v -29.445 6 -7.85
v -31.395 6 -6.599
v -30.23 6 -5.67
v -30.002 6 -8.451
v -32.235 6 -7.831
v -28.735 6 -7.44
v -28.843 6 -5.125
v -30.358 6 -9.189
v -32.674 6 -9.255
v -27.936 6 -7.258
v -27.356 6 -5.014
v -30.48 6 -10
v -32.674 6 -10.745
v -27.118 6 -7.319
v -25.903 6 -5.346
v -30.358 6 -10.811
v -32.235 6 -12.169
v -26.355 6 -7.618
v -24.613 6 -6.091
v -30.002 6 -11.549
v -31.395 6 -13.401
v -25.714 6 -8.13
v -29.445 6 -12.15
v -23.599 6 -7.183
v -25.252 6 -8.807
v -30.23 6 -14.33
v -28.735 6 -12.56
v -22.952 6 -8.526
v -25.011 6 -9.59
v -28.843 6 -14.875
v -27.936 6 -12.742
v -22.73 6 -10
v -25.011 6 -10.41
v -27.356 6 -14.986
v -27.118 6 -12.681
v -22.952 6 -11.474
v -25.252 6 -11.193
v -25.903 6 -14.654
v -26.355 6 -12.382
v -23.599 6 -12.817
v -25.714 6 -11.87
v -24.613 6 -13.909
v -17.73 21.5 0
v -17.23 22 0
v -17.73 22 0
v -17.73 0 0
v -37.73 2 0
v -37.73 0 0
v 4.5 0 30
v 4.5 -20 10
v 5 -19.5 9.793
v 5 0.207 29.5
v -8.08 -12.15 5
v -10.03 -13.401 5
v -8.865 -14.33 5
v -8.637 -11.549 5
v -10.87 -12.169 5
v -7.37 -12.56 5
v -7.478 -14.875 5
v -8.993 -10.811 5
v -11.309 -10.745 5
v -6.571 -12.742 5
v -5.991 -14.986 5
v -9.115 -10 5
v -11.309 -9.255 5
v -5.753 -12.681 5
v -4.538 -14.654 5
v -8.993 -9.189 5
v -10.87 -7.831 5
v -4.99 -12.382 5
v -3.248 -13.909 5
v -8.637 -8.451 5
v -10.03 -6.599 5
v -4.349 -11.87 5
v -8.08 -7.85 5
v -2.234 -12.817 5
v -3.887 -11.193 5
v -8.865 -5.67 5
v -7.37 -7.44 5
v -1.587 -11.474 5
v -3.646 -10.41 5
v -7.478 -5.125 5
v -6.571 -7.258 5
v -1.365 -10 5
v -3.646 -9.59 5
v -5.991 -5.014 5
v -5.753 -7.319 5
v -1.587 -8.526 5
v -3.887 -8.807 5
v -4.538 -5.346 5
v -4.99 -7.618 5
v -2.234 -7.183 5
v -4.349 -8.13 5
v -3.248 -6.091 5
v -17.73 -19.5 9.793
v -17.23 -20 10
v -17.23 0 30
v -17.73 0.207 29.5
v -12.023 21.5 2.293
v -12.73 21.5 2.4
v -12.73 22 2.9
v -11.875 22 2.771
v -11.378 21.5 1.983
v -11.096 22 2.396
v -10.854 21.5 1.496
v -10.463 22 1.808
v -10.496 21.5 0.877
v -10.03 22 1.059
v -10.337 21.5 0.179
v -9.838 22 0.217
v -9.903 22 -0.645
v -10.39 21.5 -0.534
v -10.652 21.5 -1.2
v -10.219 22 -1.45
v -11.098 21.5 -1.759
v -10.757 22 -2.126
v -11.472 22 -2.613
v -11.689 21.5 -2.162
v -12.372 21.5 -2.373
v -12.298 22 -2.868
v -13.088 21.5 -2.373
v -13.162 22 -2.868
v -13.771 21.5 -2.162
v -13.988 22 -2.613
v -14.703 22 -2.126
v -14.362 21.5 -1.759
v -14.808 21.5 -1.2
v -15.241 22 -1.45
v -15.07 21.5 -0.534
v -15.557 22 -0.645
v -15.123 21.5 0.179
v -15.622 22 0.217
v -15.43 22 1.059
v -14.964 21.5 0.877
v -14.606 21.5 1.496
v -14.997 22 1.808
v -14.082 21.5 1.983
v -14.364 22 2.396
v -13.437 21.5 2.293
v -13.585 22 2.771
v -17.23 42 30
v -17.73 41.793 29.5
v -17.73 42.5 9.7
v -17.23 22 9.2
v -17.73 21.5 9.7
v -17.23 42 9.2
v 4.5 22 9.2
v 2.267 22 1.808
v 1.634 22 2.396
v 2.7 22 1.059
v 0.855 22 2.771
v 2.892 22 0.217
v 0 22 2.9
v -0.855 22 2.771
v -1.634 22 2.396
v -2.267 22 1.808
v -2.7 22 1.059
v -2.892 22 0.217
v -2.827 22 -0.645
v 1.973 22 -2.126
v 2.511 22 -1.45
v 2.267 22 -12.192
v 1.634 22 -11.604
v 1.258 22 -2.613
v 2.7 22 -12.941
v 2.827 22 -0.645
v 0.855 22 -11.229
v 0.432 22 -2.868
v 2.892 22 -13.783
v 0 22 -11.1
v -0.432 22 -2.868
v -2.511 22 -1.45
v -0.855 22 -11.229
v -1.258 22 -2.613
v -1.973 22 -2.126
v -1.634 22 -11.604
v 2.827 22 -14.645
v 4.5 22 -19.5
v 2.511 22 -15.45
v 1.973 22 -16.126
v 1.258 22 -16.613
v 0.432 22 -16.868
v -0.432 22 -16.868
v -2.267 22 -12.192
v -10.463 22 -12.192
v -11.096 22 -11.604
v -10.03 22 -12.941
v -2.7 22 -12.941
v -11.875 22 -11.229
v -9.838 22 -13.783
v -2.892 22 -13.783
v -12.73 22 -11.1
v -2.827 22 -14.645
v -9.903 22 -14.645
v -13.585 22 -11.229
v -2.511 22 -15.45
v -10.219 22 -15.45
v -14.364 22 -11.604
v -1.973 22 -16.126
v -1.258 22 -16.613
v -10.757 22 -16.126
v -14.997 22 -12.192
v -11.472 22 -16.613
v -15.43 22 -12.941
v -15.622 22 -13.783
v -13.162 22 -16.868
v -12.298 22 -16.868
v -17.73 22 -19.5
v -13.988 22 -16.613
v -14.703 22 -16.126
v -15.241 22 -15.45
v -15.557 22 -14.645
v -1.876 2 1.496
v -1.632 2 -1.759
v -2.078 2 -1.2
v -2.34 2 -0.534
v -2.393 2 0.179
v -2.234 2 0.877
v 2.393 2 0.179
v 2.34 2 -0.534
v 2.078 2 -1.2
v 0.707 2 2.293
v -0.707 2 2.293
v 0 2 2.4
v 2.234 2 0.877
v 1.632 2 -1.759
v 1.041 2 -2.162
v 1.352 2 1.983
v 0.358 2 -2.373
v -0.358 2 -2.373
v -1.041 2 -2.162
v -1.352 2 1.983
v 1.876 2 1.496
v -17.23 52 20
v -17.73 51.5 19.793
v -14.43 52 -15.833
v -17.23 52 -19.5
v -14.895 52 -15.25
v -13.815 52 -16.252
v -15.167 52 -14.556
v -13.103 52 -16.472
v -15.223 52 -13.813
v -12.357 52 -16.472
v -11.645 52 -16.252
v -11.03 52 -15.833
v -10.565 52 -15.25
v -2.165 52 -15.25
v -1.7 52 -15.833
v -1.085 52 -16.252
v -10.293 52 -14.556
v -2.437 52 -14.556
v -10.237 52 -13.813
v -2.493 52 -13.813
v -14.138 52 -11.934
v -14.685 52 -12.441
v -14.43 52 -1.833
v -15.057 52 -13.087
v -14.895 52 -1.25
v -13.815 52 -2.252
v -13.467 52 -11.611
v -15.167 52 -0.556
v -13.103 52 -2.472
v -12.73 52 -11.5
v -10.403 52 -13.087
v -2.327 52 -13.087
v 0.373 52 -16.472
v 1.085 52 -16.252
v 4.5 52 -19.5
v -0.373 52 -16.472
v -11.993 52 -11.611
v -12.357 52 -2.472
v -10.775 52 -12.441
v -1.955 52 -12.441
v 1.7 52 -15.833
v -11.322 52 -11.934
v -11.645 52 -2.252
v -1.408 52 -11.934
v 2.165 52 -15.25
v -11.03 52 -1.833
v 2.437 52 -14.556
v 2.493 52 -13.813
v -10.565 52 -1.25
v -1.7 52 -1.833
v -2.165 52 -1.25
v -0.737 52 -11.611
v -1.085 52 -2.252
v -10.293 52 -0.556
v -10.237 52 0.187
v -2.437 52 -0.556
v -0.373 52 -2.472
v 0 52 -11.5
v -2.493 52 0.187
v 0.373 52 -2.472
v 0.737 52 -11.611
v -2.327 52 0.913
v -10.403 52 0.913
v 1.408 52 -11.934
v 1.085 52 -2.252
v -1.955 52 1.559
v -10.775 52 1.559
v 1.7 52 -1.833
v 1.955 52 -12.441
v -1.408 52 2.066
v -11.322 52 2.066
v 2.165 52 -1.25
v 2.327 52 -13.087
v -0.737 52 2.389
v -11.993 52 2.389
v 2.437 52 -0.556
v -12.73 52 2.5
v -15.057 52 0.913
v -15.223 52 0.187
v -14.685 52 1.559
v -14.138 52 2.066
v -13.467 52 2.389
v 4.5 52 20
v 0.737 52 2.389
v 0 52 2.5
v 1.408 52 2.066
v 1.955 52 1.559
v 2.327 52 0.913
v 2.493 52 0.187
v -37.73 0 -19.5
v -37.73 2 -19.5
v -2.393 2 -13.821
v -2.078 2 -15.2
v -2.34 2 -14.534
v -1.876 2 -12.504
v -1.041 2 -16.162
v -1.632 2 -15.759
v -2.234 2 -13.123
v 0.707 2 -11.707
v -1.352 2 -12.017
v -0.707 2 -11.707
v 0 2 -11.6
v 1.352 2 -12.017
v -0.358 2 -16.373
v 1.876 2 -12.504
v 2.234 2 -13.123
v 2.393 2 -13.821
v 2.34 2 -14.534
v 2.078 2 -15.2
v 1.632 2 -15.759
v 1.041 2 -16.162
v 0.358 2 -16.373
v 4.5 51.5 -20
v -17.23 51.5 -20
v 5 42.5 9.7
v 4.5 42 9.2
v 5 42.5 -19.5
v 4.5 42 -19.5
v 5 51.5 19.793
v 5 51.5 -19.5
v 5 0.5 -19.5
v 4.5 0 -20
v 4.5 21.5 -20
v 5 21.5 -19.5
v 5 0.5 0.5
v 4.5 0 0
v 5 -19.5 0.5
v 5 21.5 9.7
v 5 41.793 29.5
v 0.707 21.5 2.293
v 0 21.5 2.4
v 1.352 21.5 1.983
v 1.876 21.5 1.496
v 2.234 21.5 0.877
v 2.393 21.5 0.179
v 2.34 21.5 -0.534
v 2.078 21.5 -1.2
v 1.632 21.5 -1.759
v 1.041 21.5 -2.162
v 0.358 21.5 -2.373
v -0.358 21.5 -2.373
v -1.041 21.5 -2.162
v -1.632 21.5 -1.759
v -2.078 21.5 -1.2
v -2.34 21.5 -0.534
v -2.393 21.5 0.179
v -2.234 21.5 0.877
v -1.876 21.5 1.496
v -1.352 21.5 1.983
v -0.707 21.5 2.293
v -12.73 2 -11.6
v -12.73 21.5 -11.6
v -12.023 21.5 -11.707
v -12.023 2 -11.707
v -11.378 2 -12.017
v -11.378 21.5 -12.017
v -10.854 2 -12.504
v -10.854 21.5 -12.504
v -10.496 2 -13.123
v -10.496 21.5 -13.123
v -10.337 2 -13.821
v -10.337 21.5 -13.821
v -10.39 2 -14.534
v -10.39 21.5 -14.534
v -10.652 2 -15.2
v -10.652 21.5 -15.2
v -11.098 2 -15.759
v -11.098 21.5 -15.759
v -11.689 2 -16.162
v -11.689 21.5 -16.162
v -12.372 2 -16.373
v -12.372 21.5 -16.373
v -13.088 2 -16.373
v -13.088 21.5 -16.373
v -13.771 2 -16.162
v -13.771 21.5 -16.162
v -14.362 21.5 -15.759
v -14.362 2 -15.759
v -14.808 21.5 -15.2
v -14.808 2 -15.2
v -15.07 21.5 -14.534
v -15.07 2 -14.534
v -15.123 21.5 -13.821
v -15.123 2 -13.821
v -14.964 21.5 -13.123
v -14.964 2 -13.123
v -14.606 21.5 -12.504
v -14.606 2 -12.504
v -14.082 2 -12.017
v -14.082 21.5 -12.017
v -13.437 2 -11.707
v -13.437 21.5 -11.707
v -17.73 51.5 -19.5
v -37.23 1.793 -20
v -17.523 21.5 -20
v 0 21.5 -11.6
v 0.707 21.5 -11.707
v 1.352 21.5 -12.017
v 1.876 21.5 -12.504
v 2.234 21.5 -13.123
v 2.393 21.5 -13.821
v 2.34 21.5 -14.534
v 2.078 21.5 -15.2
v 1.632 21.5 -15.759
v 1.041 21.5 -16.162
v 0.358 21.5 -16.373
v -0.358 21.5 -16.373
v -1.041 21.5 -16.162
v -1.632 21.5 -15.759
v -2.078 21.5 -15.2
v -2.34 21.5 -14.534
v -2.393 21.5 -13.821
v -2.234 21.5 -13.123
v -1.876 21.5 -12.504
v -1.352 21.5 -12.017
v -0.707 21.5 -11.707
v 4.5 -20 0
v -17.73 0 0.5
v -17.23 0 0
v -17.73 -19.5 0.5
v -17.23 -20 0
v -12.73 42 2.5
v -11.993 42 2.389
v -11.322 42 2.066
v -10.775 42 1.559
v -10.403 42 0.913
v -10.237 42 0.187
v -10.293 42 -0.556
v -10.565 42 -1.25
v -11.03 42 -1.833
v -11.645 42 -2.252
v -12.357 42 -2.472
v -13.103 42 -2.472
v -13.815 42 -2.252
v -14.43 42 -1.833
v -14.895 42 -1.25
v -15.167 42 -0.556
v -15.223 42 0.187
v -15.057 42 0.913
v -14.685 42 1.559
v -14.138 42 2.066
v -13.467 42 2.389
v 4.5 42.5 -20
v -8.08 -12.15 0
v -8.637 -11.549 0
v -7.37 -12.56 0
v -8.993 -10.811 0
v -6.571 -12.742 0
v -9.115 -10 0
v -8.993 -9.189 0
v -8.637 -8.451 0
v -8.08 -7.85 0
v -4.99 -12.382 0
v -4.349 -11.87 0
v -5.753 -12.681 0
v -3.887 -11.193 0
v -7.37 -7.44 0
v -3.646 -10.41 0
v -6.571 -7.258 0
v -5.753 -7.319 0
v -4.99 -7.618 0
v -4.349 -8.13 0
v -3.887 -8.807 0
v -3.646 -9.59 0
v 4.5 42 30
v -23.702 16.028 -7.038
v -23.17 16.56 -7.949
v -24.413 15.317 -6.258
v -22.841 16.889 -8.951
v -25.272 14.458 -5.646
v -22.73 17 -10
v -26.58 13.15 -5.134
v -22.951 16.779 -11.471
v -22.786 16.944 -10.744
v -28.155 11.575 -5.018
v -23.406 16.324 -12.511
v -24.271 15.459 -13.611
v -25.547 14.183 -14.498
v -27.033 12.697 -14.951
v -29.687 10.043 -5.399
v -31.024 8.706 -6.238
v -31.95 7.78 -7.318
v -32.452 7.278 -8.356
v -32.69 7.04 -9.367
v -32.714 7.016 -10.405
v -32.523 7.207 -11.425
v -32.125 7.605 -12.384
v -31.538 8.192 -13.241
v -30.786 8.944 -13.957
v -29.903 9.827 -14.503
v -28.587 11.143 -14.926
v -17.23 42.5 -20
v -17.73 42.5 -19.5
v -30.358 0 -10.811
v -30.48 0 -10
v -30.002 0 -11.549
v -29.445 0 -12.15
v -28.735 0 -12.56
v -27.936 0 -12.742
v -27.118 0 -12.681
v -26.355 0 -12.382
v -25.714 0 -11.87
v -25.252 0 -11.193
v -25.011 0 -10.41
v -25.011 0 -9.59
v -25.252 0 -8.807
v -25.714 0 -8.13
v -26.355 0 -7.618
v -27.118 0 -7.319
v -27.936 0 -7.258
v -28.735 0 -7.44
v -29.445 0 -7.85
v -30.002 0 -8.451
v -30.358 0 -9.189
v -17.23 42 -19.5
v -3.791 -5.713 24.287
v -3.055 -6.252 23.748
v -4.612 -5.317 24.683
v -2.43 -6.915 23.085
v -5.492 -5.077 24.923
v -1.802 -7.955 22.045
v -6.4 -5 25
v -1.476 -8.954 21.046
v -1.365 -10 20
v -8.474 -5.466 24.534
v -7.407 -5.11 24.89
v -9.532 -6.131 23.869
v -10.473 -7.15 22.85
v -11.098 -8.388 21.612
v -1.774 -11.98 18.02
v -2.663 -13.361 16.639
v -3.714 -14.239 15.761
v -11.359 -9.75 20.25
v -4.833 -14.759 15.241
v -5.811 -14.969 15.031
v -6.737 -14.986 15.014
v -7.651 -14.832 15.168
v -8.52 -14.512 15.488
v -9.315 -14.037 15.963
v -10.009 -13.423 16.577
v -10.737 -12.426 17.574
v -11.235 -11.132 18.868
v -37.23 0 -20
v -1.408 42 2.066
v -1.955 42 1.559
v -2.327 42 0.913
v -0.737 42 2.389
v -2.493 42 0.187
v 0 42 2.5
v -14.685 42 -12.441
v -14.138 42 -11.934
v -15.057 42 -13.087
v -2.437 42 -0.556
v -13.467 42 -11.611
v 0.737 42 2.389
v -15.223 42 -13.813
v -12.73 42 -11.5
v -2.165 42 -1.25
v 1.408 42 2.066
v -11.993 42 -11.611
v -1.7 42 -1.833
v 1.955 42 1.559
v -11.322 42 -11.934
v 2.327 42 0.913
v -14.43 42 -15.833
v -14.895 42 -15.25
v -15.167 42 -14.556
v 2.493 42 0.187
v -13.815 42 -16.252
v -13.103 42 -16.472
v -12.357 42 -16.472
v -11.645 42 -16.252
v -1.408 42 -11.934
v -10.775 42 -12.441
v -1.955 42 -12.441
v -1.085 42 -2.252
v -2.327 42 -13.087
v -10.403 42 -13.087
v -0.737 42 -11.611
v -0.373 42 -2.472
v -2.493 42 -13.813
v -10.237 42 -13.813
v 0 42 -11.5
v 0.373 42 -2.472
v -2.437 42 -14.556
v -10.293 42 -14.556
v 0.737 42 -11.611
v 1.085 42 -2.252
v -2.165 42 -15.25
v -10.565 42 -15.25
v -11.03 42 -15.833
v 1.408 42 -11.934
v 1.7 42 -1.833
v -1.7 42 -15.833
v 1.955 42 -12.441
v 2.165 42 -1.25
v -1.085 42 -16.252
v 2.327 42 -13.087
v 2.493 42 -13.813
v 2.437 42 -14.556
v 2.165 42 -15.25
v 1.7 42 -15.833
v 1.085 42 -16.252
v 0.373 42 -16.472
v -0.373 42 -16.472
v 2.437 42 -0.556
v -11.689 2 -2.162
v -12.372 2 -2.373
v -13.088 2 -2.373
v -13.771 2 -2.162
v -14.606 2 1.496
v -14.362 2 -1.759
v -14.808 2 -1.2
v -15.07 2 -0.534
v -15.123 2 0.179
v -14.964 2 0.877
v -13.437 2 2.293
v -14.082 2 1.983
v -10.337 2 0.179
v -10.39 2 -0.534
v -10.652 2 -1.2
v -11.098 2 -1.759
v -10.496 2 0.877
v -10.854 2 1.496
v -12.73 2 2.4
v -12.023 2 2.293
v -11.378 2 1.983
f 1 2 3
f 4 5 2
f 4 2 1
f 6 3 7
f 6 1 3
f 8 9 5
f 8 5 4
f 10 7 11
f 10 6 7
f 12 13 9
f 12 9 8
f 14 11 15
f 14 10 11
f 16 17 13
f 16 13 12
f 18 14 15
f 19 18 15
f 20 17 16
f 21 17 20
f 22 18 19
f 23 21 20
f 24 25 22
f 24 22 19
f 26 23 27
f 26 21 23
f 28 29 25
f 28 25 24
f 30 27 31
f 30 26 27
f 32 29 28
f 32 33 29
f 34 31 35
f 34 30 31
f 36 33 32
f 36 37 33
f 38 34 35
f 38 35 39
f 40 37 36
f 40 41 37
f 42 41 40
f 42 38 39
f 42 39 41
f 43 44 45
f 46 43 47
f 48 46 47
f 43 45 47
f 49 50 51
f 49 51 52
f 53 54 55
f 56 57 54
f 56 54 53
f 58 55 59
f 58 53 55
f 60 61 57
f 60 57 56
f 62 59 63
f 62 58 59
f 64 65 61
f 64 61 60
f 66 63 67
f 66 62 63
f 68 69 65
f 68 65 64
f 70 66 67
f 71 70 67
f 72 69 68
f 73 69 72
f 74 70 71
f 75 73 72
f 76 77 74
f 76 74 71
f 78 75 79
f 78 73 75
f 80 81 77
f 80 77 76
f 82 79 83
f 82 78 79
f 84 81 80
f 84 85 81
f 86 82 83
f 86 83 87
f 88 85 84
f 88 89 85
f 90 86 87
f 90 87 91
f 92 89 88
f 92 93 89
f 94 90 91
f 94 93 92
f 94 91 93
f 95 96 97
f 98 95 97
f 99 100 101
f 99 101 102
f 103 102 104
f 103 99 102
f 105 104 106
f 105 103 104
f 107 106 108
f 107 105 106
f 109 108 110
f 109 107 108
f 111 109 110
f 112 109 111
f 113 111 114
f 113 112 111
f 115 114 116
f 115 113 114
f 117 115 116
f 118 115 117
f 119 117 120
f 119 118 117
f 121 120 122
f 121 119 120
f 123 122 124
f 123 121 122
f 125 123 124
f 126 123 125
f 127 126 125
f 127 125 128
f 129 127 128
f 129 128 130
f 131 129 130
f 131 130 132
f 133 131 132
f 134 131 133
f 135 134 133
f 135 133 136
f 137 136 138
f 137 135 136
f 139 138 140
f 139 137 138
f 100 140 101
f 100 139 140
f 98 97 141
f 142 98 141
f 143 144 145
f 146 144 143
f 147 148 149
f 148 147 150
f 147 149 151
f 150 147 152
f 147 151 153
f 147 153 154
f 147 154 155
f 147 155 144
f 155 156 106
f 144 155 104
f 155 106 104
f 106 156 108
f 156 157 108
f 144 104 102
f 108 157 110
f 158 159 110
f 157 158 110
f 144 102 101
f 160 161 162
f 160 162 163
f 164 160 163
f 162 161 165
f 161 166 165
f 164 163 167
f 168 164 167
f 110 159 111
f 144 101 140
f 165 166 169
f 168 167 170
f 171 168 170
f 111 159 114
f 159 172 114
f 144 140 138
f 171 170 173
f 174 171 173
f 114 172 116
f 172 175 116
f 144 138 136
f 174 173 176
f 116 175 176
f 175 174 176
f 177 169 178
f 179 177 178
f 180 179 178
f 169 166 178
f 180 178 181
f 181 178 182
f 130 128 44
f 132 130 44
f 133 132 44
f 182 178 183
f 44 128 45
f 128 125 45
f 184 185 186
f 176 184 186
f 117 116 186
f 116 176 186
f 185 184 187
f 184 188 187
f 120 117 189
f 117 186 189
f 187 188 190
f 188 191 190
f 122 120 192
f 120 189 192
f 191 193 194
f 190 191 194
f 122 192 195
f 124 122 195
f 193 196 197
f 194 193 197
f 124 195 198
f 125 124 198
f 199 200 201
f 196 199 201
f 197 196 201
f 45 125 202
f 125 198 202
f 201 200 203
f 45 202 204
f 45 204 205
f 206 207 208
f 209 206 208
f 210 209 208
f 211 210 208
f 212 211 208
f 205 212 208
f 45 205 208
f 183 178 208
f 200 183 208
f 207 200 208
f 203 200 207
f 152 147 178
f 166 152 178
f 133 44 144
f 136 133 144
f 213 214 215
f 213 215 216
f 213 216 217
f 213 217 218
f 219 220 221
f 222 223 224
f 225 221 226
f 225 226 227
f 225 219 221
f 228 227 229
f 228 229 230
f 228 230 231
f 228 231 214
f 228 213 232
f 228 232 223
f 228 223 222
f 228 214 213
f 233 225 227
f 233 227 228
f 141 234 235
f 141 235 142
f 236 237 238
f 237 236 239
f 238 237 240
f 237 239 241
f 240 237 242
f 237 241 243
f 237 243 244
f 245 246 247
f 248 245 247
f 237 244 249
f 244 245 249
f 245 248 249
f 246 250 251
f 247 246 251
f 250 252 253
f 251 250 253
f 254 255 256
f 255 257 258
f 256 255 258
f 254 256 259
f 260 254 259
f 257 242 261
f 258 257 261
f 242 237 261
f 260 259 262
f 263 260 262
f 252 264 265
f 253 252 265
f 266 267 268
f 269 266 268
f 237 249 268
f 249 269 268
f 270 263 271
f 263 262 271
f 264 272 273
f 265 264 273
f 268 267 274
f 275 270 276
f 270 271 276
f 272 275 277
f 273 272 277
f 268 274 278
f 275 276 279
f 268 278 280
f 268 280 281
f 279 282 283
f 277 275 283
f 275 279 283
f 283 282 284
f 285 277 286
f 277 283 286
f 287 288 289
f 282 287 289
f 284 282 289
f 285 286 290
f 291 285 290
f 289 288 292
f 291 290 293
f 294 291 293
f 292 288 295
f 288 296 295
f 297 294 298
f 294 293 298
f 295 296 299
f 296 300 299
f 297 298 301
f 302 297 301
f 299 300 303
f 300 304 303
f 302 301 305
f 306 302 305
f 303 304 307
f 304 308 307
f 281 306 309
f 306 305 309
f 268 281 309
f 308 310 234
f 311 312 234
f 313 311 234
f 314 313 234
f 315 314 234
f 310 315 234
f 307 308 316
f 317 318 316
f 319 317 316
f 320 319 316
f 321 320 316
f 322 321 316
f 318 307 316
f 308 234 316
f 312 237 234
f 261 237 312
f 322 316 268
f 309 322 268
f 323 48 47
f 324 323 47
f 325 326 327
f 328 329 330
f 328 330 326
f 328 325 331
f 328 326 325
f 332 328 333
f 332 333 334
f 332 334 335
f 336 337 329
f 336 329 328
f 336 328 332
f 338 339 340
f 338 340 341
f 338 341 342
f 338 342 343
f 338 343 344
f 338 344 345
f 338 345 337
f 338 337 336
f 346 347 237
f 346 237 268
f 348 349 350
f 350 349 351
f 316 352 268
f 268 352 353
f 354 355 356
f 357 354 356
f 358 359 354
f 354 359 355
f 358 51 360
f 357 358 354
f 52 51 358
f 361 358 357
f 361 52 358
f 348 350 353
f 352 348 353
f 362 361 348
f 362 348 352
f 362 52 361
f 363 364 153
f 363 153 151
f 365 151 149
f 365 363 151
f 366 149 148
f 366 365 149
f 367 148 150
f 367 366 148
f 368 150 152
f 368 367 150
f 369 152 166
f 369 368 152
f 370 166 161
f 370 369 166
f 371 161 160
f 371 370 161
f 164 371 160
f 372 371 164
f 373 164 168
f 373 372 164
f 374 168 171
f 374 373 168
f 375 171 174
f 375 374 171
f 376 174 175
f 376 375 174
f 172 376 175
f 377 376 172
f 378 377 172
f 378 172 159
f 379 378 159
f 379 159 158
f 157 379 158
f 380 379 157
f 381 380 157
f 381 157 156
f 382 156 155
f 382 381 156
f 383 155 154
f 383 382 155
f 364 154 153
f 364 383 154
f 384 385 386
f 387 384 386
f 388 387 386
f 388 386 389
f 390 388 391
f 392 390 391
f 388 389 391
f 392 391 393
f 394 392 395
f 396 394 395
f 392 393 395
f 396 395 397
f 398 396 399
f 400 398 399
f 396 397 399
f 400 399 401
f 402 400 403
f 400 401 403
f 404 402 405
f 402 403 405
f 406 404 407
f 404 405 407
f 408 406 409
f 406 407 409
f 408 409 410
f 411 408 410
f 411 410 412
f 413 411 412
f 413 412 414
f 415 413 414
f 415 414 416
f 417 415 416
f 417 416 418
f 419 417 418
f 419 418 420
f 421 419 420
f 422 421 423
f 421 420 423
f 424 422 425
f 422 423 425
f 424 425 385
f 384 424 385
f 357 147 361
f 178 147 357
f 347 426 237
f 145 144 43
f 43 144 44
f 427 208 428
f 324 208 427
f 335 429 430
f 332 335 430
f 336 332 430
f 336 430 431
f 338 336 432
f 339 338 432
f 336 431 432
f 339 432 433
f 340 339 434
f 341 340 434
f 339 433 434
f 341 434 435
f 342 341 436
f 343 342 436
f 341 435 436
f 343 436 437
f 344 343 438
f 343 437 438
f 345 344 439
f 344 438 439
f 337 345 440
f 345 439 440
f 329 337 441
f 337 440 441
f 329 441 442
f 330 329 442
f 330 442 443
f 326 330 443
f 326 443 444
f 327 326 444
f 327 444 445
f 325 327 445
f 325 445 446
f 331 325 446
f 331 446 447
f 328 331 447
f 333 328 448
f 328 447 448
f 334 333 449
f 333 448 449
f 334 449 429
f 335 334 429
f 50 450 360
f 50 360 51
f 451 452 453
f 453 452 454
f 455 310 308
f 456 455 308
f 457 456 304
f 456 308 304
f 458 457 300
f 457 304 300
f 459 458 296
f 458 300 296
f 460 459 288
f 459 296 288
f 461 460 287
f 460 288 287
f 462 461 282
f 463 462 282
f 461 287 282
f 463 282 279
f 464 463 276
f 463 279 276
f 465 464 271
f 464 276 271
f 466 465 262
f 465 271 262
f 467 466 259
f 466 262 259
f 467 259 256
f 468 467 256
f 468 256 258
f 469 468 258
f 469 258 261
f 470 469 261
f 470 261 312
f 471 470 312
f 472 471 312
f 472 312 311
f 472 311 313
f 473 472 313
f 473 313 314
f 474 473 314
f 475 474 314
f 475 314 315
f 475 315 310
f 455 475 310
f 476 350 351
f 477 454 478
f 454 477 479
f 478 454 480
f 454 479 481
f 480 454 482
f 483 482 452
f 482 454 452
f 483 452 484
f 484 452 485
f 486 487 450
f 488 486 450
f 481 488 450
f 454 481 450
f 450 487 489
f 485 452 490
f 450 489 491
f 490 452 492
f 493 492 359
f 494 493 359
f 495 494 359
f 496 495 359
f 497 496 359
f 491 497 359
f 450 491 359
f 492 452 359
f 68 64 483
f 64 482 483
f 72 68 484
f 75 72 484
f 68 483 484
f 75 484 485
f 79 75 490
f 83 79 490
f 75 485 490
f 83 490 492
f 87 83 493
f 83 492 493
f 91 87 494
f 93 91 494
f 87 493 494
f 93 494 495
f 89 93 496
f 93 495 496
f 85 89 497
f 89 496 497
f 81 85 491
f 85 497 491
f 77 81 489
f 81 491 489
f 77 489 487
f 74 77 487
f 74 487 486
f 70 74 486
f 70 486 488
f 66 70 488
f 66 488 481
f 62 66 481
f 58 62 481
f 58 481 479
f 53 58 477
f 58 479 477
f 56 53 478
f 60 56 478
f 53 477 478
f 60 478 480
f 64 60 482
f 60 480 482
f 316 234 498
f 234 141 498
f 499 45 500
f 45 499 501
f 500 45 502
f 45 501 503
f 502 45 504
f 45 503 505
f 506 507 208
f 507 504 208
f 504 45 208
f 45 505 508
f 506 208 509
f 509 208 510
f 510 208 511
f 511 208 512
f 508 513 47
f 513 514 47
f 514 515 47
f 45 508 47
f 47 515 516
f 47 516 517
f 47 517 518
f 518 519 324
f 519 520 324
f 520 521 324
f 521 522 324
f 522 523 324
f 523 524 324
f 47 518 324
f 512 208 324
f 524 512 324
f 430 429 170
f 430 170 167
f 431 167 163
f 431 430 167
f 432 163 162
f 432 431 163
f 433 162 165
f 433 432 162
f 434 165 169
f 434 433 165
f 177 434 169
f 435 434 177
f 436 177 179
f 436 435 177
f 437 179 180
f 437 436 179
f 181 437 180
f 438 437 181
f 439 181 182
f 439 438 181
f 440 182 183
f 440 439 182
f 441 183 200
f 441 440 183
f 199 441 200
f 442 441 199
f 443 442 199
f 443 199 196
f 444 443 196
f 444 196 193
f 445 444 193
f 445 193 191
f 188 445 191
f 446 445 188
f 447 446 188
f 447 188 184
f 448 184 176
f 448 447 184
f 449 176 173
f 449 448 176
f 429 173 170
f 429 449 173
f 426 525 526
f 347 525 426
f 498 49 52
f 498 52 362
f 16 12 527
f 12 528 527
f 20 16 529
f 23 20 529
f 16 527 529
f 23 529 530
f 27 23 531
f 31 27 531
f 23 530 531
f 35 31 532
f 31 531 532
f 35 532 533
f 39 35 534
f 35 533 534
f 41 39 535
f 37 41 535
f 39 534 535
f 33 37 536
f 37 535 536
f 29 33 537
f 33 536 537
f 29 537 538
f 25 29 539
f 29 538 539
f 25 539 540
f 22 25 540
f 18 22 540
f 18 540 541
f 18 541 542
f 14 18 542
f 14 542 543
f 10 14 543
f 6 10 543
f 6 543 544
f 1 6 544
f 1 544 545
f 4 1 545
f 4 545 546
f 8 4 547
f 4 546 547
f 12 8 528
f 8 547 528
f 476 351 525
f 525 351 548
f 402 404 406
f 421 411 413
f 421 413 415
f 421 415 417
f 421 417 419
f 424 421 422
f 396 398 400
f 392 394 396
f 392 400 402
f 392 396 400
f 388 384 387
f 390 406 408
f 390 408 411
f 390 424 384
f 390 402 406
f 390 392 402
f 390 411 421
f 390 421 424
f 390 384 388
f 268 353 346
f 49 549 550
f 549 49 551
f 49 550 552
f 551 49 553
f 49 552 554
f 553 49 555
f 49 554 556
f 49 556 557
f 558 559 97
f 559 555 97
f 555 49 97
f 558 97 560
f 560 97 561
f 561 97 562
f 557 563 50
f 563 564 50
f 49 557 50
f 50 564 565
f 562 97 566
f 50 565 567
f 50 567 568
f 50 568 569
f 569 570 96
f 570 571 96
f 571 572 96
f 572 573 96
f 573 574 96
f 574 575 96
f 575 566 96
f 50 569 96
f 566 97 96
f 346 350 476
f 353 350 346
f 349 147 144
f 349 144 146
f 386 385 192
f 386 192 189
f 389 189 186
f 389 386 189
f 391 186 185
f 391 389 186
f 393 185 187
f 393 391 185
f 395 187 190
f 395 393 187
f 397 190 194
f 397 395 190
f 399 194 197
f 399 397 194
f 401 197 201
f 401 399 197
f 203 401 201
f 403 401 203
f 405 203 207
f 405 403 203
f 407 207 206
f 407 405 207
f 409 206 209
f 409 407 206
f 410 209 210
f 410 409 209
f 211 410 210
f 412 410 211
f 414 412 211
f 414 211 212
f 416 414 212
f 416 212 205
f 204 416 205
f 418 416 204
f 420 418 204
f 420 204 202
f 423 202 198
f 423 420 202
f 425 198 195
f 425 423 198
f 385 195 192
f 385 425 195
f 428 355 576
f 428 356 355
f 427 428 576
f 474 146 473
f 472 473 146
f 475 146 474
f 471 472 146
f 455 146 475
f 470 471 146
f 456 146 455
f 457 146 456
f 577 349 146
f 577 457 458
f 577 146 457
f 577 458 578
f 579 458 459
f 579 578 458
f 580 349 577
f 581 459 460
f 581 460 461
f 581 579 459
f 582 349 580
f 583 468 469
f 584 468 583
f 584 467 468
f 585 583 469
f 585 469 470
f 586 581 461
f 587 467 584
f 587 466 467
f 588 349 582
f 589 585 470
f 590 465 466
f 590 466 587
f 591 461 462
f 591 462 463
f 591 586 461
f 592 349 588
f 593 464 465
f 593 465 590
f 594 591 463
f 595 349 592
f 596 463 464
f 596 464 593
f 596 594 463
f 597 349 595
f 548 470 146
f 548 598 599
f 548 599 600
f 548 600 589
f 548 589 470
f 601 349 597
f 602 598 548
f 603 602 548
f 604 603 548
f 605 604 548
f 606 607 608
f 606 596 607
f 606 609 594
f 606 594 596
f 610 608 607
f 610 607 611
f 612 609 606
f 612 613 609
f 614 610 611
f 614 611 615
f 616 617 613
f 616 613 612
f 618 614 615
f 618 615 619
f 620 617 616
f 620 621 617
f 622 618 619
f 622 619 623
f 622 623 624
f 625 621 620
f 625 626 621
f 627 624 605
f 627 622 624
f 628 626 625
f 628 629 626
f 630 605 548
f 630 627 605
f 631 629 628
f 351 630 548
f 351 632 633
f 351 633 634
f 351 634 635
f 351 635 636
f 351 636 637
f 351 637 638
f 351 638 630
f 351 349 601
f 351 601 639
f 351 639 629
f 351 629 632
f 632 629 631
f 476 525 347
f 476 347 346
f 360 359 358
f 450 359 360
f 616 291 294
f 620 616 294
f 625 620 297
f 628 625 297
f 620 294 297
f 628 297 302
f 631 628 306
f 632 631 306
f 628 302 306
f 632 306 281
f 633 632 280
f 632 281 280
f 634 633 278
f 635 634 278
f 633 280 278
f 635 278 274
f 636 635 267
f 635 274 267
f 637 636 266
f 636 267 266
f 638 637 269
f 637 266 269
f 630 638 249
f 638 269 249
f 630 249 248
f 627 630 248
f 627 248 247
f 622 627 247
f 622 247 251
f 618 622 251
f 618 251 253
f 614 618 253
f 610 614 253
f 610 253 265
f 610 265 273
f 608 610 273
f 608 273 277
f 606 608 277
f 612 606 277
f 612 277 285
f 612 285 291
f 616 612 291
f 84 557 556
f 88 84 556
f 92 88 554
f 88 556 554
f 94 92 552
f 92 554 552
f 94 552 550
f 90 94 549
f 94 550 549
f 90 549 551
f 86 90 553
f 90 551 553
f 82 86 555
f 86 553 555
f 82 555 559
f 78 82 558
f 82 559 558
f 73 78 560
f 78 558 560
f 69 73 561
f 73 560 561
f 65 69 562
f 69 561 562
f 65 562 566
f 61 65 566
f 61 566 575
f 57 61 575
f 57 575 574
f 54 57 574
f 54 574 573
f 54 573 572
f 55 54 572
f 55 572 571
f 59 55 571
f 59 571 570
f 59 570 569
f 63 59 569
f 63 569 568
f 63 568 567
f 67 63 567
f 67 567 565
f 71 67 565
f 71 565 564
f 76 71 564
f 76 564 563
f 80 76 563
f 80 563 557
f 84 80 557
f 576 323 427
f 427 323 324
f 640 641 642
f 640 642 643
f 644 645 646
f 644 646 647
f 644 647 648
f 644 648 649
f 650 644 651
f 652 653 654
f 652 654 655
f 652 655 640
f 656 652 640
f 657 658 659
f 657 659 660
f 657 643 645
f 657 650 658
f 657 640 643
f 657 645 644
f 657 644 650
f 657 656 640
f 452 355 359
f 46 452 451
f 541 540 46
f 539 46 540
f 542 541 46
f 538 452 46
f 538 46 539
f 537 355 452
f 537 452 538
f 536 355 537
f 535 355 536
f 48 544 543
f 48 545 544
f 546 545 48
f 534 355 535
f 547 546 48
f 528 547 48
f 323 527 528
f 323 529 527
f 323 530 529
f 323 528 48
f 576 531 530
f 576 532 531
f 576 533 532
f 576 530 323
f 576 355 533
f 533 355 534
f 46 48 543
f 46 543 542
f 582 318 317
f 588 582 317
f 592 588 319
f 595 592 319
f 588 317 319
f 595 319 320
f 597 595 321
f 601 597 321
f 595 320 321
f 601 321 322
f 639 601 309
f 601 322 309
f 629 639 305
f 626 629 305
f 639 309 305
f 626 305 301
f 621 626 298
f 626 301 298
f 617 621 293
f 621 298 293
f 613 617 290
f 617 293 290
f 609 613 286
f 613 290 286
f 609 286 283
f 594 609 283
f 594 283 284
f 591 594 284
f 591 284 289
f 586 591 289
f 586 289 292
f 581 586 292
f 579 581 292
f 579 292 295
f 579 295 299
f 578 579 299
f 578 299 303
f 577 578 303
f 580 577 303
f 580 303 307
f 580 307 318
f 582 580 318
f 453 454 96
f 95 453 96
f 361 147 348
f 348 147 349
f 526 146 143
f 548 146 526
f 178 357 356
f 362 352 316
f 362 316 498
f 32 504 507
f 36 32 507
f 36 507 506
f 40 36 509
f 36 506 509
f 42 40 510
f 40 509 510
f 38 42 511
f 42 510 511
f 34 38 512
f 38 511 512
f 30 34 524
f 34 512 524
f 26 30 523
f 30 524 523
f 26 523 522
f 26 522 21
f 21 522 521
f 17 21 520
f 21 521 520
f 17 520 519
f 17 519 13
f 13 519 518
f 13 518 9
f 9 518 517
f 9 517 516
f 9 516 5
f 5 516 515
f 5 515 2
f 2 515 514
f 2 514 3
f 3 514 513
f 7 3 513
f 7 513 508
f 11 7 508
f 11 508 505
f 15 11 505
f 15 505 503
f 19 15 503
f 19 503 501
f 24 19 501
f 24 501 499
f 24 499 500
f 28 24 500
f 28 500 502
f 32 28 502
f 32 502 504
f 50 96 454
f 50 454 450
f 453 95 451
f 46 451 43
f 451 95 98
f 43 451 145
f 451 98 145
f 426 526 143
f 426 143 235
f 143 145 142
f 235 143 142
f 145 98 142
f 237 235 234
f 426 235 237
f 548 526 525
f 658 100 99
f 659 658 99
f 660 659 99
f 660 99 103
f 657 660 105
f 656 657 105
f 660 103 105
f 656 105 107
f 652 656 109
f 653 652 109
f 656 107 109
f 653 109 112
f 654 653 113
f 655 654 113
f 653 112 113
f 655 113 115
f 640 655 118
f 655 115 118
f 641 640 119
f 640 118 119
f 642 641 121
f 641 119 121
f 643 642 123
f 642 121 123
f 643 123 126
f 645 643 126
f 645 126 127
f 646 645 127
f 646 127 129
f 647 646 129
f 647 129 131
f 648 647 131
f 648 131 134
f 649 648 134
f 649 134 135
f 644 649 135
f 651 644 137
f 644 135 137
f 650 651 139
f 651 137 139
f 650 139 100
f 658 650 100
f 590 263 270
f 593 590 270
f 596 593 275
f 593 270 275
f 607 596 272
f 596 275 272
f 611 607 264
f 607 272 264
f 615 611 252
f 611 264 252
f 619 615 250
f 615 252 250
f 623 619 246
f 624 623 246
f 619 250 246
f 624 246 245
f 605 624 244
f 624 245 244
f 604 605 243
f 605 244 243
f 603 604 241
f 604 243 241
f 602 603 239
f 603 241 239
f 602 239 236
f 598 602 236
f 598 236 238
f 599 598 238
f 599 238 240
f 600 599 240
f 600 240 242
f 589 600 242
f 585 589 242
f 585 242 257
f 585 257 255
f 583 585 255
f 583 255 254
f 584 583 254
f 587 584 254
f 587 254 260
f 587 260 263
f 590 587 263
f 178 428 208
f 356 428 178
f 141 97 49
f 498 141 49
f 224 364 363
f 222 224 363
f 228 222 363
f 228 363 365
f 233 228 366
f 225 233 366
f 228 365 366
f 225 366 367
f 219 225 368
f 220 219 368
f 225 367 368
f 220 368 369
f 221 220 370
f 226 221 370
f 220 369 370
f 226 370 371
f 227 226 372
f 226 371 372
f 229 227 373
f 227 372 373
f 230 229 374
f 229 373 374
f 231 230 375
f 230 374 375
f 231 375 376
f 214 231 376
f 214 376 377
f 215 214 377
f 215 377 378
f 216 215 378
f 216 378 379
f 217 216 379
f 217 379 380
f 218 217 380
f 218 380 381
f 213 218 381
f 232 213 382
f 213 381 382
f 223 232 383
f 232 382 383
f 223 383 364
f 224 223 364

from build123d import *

# Parameters (mm, degrees)
SKETCH2_W                      = 22.73
SKETCH2_H                      = 30
BOSS_EXTRUDE1_DEPTH            = 52
SKETCH3_W                      = 22.73
SKETCH3_H                      = 10
BOSS_EXTRUDE2_DEPTH            = 20
CBORE_FOR_M5_SHCS1_D           = 5.5
CBORE_FOR_M5_SHCS1_CBORE_D     = 10
CBORE_FOR_M5_SHCS1_CBORE_DEPTH = 5
BOSS_EXTRUDE3_START            = 20
SKETCH7_W                      = 22.73
SKETCH7_H                      = 72
SKETCH7_R                      = 5
BOSS_EXTRUDE3_DEPTH            = 20
SKETCH8_W                      = 29.2
SKETCH8_H                      = 20
CUT_EXTRUDE1_DEPTH             = 65.192311845
CUT_EXTRUDE2_REACH             = 81.99
SKETCH9_R                      = 2.5
SKETCH10_R                     = 2.4
CUT_EXTRUDE3_DEPTH             = 20
SKETCH12_W                     = 20
SKETCH12_H                     = 22
BOSS_EXTRUDE5_DEPTH            = 20
CBORE_FOR_M5_SHCS2_D           = 5.5
CBORE_FOR_M5_SHCS2_CBORE_D     = 10
CBORE_FOR_M5_SHCS2_CBORE_DEPTH = 16
CHAMFER1_SIZE                  = 20
CHAMFER3_SIZE                  = 10
CHAMFER2_SIZE                  = 0.5


with BuildPart() as part:
    # Sketch2 → Boss-Extrude1 (new body)
    with BuildSketch(Plane(origin=(0, 0, 0), x_dir=(1, 0, 0), z_dir=(0, 1, 0))):
        with Locations((-6.365, 5)):
            Rectangle(SKETCH2_W, SKETCH2_H)
    extrude(amount=BOSS_EXTRUDE1_DEPTH)

    # Sketch3 → Boss-Extrude2 (add)
    with BuildSketch(Plane.XZ):
        with Locations((-6.365, 5)):
            Rectangle(SKETCH3_W, SKETCH3_H)
    extrude(amount=BOSS_EXTRUDE2_DEPTH)

    # CBORE for M5 SHCS1 (through all)
    with Locations(Plane.XY.offset(10)):
        with Locations((-6.365, -10)):
            CounterBoreHole(CBORE_FOR_M5_SHCS1_D / 2, CBORE_FOR_M5_SHCS1_CBORE_D / 2, CBORE_FOR_M5_SHCS1_CBORE_DEPTH)

    # Sketch7 → Boss-Extrude3 (add)
    with BuildSketch(Plane.XY.offset(10).offset(BOSS_EXTRUDE3_START)):
        with Locations((-6.365, 16)):
            Rectangle(SKETCH7_W, SKETCH7_H)
        with Locations((-6.365, -10)):
            Circle(SKETCH7_R, mode=Mode.SUBTRACT)
    extrude(amount=-BOSS_EXTRUDE3_DEPTH)

    # Sketch8 → Cut-Extrude1 (cut, through all)
    with BuildSketch(Plane(origin=(5, 0, 0), x_dir=(0, 0, -1), z_dir=(1, 0, 0))):
        with Locations((5.4, 32)):
            Rectangle(SKETCH8_W, SKETCH8_H)
    extrude(amount=-CUT_EXTRUDE1_DEPTH, mode=Mode.SUBTRACT)

    # Sketch9 → Cut-Extrude2 (cut, up to next)
    with BuildSketch(Plane(origin=(0, 52, 0), x_dir=(1, 0, 0), z_dir=(0, 1, 0)), mode=Mode.PRIVATE) as cut_extrude2_sk1:
        with Locations(Location((-12.73, 0, 0), (0, 0, 270))):
            Circle(SKETCH9_R)
    cut_extrude2_tool1 = extrude(cut_extrude2_sk1.sketch, amount=-CUT_EXTRUDE2_REACH, mode=Mode.PRIVATE) & part.part
    # Sketch9 → Cut-Extrude2 (cut, up to next)
    with BuildSketch(Plane(origin=(0, 52, 0), x_dir=(1, 0, 0), z_dir=(0, 1, 0)), mode=Mode.PRIVATE) as cut_extrude2_sk2:
        with Locations(Location((0, 14, 0), (0, 0, 270))):
            Circle(SKETCH9_R)
    cut_extrude2_tool2 = extrude(cut_extrude2_sk2.sketch, amount=-CUT_EXTRUDE2_REACH, mode=Mode.PRIVATE) & part.part
    # Sketch9 → Cut-Extrude2 (cut, up to next)
    with BuildSketch(Plane(origin=(0, 52, 0), x_dir=(1, 0, 0), z_dir=(0, 1, 0)), mode=Mode.PRIVATE) as cut_extrude2_sk3:
        with Locations(Location((-12.73, 14, 0), (0, 0, 270))):
            Circle(SKETCH9_R)
    cut_extrude2_tool3 = extrude(cut_extrude2_sk3.sketch, amount=-CUT_EXTRUDE2_REACH, mode=Mode.PRIVATE) & part.part
    # Sketch9 → Cut-Extrude2 (cut, up to next)
    with BuildSketch(Plane(origin=(0, 52, 0), x_dir=(1, 0, 0), z_dir=(0, 1, 0)), mode=Mode.PRIVATE) as cut_extrude2_sk4:
        with Locations(Location((0, 0, 0), (0, 0, 270))):
            Circle(SKETCH9_R)
    cut_extrude2_tool4 = extrude(cut_extrude2_sk4.sketch, amount=-CUT_EXTRUDE2_REACH, mode=Mode.PRIVATE) & part.part
    add(cut_extrude2_tool1.solids().sort_by_distance((-12.73, 52, 0))[0], mode=Mode.SUBTRACT)
    add(cut_extrude2_tool2.solids().sort_by_distance((0, 52, -14))[0], mode=Mode.SUBTRACT)
    add(cut_extrude2_tool3.solids().sort_by_distance((-12.73, 52, -14))[0], mode=Mode.SUBTRACT)
    add(cut_extrude2_tool4.solids().sort_by_distance((0, 52, 0))[0], mode=Mode.SUBTRACT)

    # Sketch10 → Cut-Extrude3 (cut)
    with BuildSketch(Plane(origin=(0, 22, 0), x_dir=(1, 0, 0), z_dir=(0, 1, 0))):
        with Locations(Location((0, 0, 0), (0, 0, 270))):
            Circle(SKETCH10_R)
        with Locations(Location((-12.73, 0, 0), (0, 0, 270))):
            Circle(SKETCH10_R)
        with Locations(Location((-12.73, 14, 0), (0, 0, 270))):
            Circle(SKETCH10_R)
        with Locations(Location((0, 14, 0), (0, 0, 270))):
            Circle(SKETCH10_R)
    extrude(amount=-CUT_EXTRUDE3_DEPTH, mode=Mode.SUBTRACT)

    # Sketch12 → Boss-Extrude5 (add)
    with BuildSketch(Plane(origin=(0, 0, -20), x_dir=(-1, 0, 0), z_dir=(0, 0, -1))):
        with Locations((27.73, 11)):
            Rectangle(SKETCH12_W, SKETCH12_H)
    extrude(amount=-BOSS_EXTRUDE5_DEPTH)

    # CBORE for M5 SHCS2 (through all)
    with Locations(Plane(origin=(0, 22, 0), x_dir=(1, 0, 0), z_dir=(0, 1, 0))):
        with Locations((-27.73, 10)):
            CounterBoreHole(CBORE_FOR_M5_SHCS2_D / 2, CBORE_FOR_M5_SHCS2_CBORE_D / 2, CBORE_FOR_M5_SHCS2_CBORE_DEPTH)

    # Chamfer1
    # the kernel refuses this chamfer: 20 mm, written as the material it takes off along each edge
    with BuildSketch(Plane(origin=(-69.163659759, -20, 30), x_dir=(0, 0.9996219169112968, 0.027495876610586317), z_dir=(1, 0, 0))) as chamfer1_piece_1:
        Polygon((CHAMFER1_SIZE * 0.999621916911, -CHAMFER1_SIZE * 0.0274958766106), (-CHAMFER1_SIZE * 0.0274958766106, -CHAMFER1_SIZE * 0.999621916911), (0, 0), align=None)
    extrude(amount=125.597319519, mode=Mode.SUBTRACT)
    with BuildSketch(Plane(origin=(-37.73, 22, -71.433659759), x_dir=(0.9996219169112968, 0.027495876610586317, 0), z_dir=(0, 0, 1))) as chamfer1_piece_2:
        Polygon((CHAMFER1_SIZE * 0.999621916911, -CHAMFER1_SIZE * 0.0274958766106), (-CHAMFER1_SIZE * 0.0274958766106, -CHAMFER1_SIZE * 0.999621916911), (0, 0), align=None)
    extrude(amount=122.867319519, mode=Mode.SUBTRACT)

    # Chamfer3
    chamfer3_edges = [part.edges().sort_by_distance(p)[0] for p in [
        (-6.365, 52, 30),
    ]]
    chamfer(chamfer3_edges, length=CHAMFER3_SIZE)

    # Chamfer2
    chamfer2_edges = [part.edges().sort_by_distance(p)[0] for p in [
        (5, 52, 0),
        (5, 11, -20),
        (5, 47, -20),
        (5, 0, -10),
        (5, -10, 0),
        (5, -20, 5),
        (5, -10, 20),
        (5, 21, 30),
        (-17.73, -10, 0),
        (-17.73, 47, -20),
        (-17.73, 52, 0),
        (-17.73, 21, 30),
        (-17.73, -10, 20),
        (-17.73, -20, 5),
        (5, 42, -5.4),
        (5, 32, 9.2),
        (5, 22, -5.4),
        (-17.73, 22, 4.6),
        (-17.73, 32, 9.2),
        (-17.73, 42, -5.4),
        (0, 22, -16.4),
        (-12.73, 22, -16.4),
        (-12.73, 22, -2.4),
        (0, 22, -2.4),
        (5, 47, 25),
        (-17.73, 47, 25),
        (-37.73, 1, -20),
        (-27.73, 12, -20),
        (-6.365, 22, -20),
        (-6.365, 42, -20),
        (-6.365, 52, -20),
    ]]
    chamfer(chamfer2_edges, length=CHAMFER2_SIZE)


solid = part.part
